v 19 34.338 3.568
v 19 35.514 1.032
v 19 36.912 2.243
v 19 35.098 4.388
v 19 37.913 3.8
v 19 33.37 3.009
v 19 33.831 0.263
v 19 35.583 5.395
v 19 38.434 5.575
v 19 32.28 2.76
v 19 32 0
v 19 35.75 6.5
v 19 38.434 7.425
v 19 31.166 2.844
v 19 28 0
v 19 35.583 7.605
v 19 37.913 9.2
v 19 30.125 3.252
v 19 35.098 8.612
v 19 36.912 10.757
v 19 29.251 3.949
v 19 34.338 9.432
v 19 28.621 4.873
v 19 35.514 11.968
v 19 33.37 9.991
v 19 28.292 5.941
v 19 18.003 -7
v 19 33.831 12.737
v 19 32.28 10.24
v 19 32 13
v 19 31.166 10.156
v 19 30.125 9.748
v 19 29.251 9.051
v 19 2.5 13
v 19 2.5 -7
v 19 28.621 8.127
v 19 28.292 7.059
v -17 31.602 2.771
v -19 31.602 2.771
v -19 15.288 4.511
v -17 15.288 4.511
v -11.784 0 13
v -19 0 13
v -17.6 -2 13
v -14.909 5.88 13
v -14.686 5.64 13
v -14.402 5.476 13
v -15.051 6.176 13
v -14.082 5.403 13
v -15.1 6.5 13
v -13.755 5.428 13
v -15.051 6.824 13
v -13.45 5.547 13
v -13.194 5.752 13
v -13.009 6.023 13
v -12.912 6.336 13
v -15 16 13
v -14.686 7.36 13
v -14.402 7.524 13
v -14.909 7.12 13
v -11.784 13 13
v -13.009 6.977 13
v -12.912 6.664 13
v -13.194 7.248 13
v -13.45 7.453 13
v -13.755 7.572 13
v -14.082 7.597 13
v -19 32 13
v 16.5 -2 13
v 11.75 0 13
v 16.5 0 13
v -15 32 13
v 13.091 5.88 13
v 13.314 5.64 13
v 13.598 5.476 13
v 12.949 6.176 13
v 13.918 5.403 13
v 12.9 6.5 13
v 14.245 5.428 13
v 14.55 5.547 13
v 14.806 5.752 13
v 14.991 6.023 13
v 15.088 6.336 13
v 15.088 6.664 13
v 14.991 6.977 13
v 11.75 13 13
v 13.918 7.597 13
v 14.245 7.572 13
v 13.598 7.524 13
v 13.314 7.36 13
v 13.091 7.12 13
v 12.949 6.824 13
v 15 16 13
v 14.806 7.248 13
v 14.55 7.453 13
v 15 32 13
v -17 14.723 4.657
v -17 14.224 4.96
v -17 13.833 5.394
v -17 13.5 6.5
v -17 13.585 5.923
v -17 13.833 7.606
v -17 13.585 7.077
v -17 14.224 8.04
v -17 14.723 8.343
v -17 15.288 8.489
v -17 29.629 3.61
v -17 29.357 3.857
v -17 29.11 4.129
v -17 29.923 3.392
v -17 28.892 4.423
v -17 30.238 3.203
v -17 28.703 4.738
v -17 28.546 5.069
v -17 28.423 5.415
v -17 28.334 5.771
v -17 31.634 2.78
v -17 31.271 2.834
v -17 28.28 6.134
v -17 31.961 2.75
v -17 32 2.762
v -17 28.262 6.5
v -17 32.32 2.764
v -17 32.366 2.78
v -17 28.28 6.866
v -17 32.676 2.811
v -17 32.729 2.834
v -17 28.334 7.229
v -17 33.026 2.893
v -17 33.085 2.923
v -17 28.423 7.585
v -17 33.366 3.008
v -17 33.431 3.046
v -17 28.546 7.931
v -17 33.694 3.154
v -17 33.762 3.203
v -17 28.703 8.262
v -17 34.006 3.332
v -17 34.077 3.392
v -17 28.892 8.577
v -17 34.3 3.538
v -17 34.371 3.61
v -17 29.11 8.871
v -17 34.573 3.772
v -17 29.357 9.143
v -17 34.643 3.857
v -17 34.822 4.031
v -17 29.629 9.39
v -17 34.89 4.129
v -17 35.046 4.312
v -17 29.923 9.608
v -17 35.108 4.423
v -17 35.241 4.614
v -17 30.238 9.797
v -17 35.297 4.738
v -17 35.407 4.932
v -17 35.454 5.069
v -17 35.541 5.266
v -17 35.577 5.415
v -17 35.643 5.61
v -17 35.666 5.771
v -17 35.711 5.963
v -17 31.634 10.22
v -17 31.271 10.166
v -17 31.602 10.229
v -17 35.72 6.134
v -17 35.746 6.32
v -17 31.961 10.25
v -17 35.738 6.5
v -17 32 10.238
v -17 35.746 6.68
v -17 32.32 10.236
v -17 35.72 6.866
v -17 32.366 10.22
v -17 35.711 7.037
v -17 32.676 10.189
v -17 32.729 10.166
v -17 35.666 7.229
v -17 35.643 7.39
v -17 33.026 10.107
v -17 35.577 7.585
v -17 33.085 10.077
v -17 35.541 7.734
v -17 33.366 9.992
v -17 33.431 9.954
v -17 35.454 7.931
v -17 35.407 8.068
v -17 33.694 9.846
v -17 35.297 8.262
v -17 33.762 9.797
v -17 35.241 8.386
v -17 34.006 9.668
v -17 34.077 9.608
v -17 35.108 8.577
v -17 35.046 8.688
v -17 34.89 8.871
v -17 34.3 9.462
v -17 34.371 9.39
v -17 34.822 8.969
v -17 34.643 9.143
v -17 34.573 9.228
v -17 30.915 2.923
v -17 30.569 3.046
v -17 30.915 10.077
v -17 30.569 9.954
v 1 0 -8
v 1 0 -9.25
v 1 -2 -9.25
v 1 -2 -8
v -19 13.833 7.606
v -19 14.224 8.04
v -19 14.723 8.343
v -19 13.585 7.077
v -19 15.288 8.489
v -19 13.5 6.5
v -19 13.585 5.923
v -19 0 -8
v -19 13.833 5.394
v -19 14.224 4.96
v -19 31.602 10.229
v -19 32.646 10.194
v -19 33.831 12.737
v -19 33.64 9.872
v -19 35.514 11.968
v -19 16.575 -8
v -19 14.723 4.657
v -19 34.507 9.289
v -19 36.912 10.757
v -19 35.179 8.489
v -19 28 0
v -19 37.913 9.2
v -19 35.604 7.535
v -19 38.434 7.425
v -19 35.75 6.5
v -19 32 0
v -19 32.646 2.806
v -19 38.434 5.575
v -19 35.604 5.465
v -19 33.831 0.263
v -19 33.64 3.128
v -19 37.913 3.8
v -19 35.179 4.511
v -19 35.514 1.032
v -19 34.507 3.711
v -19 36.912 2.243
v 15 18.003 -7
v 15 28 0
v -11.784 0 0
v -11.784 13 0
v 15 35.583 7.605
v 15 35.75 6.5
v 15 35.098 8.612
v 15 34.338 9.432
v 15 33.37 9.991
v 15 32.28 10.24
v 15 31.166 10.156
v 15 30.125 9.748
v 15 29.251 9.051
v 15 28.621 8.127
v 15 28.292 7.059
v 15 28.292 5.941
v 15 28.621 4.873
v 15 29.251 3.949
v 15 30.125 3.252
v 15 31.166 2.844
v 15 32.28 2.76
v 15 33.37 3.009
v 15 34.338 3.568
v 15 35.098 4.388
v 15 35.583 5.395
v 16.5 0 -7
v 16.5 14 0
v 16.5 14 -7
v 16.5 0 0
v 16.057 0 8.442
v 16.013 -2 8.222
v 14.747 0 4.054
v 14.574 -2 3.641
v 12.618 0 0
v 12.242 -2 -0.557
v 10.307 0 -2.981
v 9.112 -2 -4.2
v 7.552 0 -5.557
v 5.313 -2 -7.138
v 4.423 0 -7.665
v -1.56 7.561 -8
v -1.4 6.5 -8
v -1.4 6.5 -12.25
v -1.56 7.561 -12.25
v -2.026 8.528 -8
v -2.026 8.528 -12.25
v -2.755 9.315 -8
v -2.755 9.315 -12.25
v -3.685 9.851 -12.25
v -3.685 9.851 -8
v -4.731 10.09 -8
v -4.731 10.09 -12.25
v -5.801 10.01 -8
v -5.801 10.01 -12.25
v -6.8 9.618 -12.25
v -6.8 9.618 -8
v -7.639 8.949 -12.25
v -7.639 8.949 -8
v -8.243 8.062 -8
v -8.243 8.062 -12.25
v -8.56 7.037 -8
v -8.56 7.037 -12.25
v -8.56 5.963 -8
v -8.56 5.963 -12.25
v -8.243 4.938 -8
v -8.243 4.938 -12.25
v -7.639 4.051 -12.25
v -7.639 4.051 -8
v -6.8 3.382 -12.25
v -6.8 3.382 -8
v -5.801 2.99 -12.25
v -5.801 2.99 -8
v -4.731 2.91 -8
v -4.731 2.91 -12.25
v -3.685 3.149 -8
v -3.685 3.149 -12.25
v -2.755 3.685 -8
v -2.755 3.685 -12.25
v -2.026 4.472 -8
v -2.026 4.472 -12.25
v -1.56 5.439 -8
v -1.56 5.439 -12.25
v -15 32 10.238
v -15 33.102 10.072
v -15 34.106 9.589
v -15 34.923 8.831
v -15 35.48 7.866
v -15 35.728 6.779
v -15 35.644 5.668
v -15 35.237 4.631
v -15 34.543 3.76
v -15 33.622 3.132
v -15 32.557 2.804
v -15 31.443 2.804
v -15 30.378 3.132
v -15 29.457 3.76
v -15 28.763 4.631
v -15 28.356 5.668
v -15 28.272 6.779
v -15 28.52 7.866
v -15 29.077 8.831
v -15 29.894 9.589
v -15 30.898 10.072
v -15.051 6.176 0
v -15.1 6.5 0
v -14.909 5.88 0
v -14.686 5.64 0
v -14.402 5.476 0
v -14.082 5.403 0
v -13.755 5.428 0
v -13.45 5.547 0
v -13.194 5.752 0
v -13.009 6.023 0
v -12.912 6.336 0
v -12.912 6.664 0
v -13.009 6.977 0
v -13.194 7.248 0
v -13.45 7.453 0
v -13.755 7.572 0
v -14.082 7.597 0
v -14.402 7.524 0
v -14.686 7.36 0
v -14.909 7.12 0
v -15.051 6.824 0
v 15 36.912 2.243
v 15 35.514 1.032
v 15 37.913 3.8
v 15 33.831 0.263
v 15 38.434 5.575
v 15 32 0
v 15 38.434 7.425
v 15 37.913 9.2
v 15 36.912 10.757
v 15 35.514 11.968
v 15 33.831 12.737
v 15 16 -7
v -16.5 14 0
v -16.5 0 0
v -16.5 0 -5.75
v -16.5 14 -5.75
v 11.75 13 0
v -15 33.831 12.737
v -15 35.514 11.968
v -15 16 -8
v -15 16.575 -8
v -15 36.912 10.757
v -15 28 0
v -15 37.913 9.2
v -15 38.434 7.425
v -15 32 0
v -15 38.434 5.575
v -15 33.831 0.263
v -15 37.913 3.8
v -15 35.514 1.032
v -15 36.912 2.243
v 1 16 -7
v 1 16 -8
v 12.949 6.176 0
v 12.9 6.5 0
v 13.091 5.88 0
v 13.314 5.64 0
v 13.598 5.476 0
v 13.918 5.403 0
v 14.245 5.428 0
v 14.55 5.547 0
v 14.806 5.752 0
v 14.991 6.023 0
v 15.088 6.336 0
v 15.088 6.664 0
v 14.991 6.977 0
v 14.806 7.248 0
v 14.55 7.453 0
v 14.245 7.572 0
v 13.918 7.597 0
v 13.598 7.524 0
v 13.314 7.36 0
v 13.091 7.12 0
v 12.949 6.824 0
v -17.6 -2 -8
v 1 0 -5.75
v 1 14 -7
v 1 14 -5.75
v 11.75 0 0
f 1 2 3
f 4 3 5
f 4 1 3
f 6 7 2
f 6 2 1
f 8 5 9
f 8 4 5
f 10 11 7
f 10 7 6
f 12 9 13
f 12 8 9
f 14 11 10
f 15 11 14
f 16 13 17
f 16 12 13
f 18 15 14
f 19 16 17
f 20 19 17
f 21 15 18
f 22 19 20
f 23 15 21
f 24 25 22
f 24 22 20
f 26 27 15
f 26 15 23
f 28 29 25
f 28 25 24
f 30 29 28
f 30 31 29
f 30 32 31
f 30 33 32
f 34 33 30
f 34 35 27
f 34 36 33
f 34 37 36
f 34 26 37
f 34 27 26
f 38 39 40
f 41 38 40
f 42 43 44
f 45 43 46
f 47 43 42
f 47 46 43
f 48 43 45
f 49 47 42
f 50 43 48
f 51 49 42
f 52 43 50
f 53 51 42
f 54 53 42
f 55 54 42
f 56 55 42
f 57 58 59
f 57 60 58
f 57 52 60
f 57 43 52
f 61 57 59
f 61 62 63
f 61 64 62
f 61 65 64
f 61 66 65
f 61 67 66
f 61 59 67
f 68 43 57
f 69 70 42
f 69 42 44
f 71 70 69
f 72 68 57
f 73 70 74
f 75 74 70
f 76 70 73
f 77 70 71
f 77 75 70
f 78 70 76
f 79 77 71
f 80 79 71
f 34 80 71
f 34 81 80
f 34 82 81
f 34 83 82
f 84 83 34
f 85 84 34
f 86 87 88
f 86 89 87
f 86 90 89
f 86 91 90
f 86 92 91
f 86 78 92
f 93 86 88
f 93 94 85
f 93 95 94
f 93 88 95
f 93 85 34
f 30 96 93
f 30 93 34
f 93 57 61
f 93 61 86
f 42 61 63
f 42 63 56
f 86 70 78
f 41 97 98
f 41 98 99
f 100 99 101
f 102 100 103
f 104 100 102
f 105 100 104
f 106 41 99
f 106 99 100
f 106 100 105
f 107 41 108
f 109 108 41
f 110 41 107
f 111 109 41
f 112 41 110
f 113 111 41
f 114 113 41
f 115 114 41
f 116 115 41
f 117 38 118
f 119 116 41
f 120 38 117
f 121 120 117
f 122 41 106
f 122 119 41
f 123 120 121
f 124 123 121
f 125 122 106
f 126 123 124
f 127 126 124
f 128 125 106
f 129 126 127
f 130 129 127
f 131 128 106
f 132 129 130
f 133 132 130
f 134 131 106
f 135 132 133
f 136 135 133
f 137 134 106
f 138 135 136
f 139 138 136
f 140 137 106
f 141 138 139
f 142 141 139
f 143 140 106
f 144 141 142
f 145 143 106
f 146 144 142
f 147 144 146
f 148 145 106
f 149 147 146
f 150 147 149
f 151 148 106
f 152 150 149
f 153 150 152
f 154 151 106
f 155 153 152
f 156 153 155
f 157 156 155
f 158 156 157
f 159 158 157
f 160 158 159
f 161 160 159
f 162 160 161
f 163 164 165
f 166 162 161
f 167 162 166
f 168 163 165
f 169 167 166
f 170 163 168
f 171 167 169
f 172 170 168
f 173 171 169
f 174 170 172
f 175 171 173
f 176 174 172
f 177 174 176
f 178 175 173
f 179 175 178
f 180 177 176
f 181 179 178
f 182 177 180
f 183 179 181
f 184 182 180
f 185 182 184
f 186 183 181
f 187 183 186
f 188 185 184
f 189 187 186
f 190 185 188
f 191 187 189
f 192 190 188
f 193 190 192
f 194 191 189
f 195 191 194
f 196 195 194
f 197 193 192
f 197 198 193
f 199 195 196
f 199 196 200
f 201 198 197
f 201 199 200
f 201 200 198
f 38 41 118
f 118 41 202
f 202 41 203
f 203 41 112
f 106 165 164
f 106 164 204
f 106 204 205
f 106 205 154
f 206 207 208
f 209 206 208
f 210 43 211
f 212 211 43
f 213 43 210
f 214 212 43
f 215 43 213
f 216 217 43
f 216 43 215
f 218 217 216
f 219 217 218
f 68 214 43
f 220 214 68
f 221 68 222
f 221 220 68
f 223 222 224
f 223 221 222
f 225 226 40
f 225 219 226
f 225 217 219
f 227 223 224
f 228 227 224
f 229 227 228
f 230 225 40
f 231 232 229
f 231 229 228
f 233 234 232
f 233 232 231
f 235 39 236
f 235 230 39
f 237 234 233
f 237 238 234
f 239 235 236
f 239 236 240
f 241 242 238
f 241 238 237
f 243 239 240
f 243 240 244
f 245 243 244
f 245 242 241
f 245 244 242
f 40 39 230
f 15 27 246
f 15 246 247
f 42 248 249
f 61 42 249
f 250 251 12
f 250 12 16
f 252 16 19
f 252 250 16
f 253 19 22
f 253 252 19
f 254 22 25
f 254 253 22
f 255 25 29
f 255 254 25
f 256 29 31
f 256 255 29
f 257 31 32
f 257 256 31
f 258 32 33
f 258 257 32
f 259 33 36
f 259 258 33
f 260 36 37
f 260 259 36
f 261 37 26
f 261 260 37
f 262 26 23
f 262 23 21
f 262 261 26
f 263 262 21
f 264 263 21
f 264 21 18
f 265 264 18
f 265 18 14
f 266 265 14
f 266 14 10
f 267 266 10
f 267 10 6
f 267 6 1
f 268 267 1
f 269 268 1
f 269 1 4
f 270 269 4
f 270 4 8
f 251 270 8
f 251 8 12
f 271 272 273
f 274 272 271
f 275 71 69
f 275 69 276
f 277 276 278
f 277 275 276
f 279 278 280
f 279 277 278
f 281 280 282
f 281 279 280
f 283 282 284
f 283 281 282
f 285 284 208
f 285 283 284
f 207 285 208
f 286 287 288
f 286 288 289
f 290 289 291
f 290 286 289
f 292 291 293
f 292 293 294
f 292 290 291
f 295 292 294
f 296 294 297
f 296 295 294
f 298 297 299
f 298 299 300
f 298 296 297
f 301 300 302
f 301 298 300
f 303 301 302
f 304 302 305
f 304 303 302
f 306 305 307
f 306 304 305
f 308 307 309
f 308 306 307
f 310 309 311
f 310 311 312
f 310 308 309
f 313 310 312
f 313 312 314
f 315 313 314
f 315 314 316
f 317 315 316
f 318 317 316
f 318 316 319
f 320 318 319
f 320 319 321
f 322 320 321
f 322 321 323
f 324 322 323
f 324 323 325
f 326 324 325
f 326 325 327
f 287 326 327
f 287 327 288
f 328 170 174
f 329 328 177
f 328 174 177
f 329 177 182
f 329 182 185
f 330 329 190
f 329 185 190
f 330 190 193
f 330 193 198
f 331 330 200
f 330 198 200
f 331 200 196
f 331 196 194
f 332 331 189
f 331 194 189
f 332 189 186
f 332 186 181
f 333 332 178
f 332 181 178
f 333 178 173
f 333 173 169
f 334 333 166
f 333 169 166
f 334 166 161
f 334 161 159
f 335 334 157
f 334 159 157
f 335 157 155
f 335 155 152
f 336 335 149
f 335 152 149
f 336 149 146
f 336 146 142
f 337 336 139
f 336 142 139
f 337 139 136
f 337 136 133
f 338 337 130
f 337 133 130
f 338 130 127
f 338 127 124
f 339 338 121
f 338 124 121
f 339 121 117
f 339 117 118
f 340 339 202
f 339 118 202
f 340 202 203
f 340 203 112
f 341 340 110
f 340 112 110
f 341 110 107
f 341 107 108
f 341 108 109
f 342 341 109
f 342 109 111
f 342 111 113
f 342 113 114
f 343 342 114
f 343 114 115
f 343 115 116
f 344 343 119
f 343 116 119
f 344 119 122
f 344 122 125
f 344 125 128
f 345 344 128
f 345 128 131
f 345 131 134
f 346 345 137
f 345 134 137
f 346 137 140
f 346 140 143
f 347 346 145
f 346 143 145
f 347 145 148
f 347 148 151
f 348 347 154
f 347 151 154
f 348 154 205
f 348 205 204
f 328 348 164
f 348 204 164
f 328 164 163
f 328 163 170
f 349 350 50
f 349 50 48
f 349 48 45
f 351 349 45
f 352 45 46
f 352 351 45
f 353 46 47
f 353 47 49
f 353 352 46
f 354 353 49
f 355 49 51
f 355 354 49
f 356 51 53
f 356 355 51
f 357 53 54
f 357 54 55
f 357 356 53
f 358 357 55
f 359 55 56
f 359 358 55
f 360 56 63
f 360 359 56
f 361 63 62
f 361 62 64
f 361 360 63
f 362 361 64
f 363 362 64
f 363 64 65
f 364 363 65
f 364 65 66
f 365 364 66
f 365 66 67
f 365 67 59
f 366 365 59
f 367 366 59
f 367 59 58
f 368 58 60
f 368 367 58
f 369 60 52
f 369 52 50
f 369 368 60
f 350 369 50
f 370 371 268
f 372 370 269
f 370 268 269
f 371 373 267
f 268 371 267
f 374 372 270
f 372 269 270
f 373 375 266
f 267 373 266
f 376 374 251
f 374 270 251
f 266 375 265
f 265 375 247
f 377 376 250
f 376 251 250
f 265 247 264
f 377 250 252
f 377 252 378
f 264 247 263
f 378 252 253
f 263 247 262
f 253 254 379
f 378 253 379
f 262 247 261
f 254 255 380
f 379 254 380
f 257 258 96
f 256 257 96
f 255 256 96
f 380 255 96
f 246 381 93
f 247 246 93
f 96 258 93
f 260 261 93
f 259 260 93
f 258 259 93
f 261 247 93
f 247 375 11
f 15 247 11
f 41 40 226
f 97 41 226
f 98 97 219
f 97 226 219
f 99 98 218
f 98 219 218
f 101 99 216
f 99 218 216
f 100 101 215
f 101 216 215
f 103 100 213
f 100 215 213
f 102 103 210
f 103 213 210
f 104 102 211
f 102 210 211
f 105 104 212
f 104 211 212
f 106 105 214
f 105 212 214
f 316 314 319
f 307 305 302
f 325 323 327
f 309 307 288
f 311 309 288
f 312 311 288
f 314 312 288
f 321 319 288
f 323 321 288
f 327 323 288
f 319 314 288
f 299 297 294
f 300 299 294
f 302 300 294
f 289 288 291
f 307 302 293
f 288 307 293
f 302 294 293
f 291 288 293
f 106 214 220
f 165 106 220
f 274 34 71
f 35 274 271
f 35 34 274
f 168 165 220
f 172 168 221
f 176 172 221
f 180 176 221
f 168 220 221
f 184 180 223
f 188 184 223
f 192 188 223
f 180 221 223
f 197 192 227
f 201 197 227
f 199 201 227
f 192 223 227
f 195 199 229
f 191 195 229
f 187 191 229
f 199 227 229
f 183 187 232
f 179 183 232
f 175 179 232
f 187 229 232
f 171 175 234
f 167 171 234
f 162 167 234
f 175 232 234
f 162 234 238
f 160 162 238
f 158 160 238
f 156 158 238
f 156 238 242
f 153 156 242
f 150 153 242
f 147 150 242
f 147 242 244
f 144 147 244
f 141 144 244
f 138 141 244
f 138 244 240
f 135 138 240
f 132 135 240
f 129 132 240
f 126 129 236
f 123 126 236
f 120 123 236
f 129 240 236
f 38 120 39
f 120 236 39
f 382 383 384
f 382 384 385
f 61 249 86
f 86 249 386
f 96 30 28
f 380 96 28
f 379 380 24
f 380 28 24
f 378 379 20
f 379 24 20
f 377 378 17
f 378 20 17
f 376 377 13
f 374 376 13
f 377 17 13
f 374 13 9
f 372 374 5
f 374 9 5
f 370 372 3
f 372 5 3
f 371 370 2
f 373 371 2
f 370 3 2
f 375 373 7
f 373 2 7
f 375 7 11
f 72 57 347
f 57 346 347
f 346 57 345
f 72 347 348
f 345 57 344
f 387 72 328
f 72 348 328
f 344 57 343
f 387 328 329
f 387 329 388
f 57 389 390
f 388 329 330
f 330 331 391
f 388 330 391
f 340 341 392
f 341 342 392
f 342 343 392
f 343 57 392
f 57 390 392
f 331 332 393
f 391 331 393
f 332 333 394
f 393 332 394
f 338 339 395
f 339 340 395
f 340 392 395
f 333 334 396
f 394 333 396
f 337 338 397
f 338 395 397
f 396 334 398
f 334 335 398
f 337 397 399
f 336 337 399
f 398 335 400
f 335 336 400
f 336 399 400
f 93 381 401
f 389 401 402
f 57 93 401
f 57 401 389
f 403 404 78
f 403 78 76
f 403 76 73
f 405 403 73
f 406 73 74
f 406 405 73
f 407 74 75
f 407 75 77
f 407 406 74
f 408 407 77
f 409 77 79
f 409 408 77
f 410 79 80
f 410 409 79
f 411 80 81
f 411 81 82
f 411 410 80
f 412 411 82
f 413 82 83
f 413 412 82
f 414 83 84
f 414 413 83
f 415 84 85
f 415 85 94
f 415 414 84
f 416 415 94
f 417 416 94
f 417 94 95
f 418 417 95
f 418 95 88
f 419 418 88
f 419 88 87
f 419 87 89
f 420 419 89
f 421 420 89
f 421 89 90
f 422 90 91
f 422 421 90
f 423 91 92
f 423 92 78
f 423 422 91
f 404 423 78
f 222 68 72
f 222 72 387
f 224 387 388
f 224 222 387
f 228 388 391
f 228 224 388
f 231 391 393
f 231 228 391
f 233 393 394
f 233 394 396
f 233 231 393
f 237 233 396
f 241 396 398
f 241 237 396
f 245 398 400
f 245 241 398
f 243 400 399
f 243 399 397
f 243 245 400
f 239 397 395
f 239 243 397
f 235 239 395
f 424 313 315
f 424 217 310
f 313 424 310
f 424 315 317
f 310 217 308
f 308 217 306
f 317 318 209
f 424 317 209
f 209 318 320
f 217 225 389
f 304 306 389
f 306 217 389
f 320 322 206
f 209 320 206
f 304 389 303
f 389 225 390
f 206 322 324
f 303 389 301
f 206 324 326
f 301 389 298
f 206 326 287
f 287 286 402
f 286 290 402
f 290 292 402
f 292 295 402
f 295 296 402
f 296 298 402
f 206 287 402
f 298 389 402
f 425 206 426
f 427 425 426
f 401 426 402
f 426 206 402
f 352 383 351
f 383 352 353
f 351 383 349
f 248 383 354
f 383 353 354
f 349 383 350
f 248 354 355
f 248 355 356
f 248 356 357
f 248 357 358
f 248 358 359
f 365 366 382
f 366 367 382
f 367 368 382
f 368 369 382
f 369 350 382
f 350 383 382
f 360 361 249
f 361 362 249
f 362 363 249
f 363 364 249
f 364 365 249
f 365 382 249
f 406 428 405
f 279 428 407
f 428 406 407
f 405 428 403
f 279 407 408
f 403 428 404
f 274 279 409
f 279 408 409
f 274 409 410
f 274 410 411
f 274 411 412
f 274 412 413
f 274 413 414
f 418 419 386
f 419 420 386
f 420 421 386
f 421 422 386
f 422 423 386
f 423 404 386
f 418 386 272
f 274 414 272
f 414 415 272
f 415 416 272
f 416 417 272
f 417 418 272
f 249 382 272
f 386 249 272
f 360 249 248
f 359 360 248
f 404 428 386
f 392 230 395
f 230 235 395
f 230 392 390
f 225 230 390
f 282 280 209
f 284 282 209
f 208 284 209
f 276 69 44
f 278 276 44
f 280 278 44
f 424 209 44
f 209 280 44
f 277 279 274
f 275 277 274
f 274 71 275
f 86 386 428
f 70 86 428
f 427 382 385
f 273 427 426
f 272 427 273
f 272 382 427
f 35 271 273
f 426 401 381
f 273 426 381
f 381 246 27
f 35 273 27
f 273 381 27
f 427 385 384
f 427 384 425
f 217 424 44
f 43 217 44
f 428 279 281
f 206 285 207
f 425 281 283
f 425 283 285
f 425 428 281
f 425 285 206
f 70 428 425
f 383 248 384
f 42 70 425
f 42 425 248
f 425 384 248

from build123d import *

# Parameters (mm, degrees)
SKETCH_1_R          = 1.1
EXTRUDE_1_DEPTH     = 13
EXTRUDE_2_DEPTH     = 4
CUT_EXTRUDE_1_DEPTH = 2
SKETCH_4_R          = 3.738204999
CUT_EXTRUDE_2_DEPTH = 2
EXTRUDE_4_DEPTH     = 7
CUT_EXTRUDE_START   = -10
SKETCH_9_R          = 3.75
CUT_EXTRUDE_3_DEPTH = 10
SKETCH_10_W         = 20
SKETCH_10_H         = 16
EXTRUDE_5_DEPTH     = 2.25
CHAMFER_1_SIZE      = 2.5
EXTRUDE_8_DEPTH     = 2
CUT_EXTRUDE_4_DEPTH = 1.25
SKETCH_11_R         = 3.6
EXTRUDE_9_DEPTH     = 5.25
SKETCH_15_W         = 17.5
SKETCH_15_H         = 14
EXTRUDE_10_DEPTH    = 1.25
CHAMFER_2_SIZE      = 12
CHAMFER_2_SIZE_2    = 8.402490459
CHAMFER_3_SIZE      = 8.402490459
CHAMFER_3_SIZE_2    = 12
CHAMFER_4_SIZE      = 2
CHAMFER_4_SIZE2     = 1.400415076


with BuildPart() as part:
    # 草图1 → 凸台-拉伸1 (new body)
    with BuildSketch(Plane.XY):
        Polygon((15, 16), (-15, 16), (-15, 32), (-19, 32), (-19, 0), (-11.784120735, 0), (-11.784120735, 13), (11.75, 13), (11.75, 0), (19, 0), (19, 32), (15, 32), align=None)
        with Locations(Location((-14, 6.5, 0), (0, 0, 180))):
            Circle(SKETCH_1_R, mode=Mode.SUBTRACT)
        with Locations(Location((14, 6.5, 0), (0, 0, 180))):
            Circle(SKETCH_1_R, mode=Mode.SUBTRACT)
    extrude(amount=EXTRUDE_1_DEPTH)

    # 草图2 → 凸台-拉伸2 (add)
    with BuildSketch(Plane(origin=(19, 0, 0), x_dir=(0, 0, -1), z_dir=(1, 0, 0))):
        with BuildLine():
            Line((0, 32), (-13, 32))
            ThreePointArc((-13, 32), (-6.5, 38.5), (0, 32))
        make_face()
    extrude_2 = extrude(amount=-EXTRUDE_2_DEPTH)

    # 镜向1: 凸台-拉伸2 across plane
    add(extrude_2.mirror(Plane(origin=(0, 0, 0), x_dir=(0, 0, 1), z_dir=(1, 0, 0))))

    # 草图3 → 切除-拉伸1 (cut)
    with BuildSketch(Plane.ZY.offset(19)):
        with BuildLine():
            Line((2.771151248, 31.602272727), (4.511280666, 15.287878788))
            ThreePointArc((4.511280666, 15.287878788), (6.5, 13.5), (8.488719334, 15.287878788))
            Line((8.488719334, 15.287878788), (10.228848752, 31.602272727))
            ThreePointArc((10.228848752, 31.602272727), (6.5, 35.75), (2.771151248, 31.602272727))
        make_face()
    extrude(amount=-CUT_EXTRUDE_1_DEPTH, mode=Mode.SUBTRACT)

    # 草图4 → 切除-拉伸2 (cut)
    with BuildSketch(Plane.ZY.offset(17)):
        with Locations((6.5, 32)):
            Circle(SKETCH_4_R)
    extrude(amount=-CUT_EXTRUDE_2_DEPTH, mode=Mode.SUBTRACT)

    # 草图5 → 凸台-拉伸4 (add)
    with BuildSketch(Plane(origin=(0, 0, 0), x_dir=(-1, 0, 0), z_dir=(0, 0, -1))):
        Polygon((-19, 16), (19, 16), (19, 0), (16.5, 0), (16.5, 14), (-16.5, 14), (-16.5, 0), (-19, 0), align=None)
    extrude(amount=EXTRUDE_4_DEPTH)

    # 草图9 → 切除-拉伸3 (cut)
    with BuildSketch(Plane(origin=(19, 0, 0), x_dir=(0, 0, -1), z_dir=(1, 0, 0)).offset(CUT_EXTRUDE_START)):
        with Locations(Location((-6.5, 32, 0), (0, 0, 90))):
            Circle(SKETCH_9_R)
    extrude(amount=CUT_EXTRUDE_3_DEPTH, mode=Mode.SUBTRACT)

    # 草图10 → 凸台-拉伸5 (add)
    with BuildSketch(Plane(origin=(0, 0, -7), x_dir=(-1, 0, 0), z_dir=(0, 0, -1))):
        with Locations((9, 8)):
            Rectangle(SKETCH_10_W, SKETCH_10_H)
    extrude(amount=EXTRUDE_5_DEPTH)

    # 倒角1
    chamfer_1_edges = [part.edges().sort_by_distance(p)[0] for p in [
        (19, 0, 3),
    ]]
    chamfer(chamfer_1_edges, length=CHAMFER_1_SIZE)

    # 草图12 → 凸台-拉伸8 (add)
    with BuildSketch(Plane.XZ):
        with BuildLine():
            Line((1, 13), (16.5, 13))
            ThreePointArc((16.5, 13), (12.241770088, -0.55746905), (1, -9.25))
            Line((1, -9.25), (-19, -9.25))
            Line((-19, -9.25), (-19, 13))
            Line((-19, 13), (1, 13))
        make_face()
    extrude(amount=EXTRUDE_8_DEPTH)

    # 草图13 → 切除-拉伸4 (cut)
    with BuildSketch(Plane(origin=(0, 0, -9.25), x_dir=(-1, 0, 0), z_dir=(0, 0, -1))):
        Polygon((19, -2), (19, 16), (-1, 16), (-1, 0), (-1, -2), align=None)
    extrude(amount=-CUT_EXTRUDE_4_DEPTH, mode=Mode.SUBTRACT)

    # 草图11 → 凸台-拉伸9 (add)
    with BuildSketch(Plane.XY.offset(-7)):
        with Locations((-5, 6.5)):
            Circle(SKETCH_11_R)
    extrude(amount=-EXTRUDE_9_DEPTH)

    # 草图15 → 凸台-拉伸10 (add)
    with BuildSketch(Plane.XY.offset(-7)):
        with Locations((-7.75, 7)):
            Rectangle(SKETCH_15_W, SKETCH_15_H)
    extrude(amount=EXTRUDE_10_DEPTH)

    # 倒角2
    # the kernel refuses this chamfer: 12, 8.402490459 mm, written as the material it adds along each edge
    with BuildSketch(Plane(origin=(-15, 16, 0), x_dir=(0, 0.9997533347641299, 0.022209674198457065), z_dir=(-1, 0, 0))) as chamfer_2_piece_1_section:
        Polygon((CHAMFER_2_SIZE * 0.999753334764, CHAMFER_2_SIZE * 0.0222096741985), (-CHAMFER_2_SIZE_2 * 0.0222096741972, CHAMFER_2_SIZE_2 * 0.999753334707), (0, 0), align=None)
    chamfer_2_piece_1 = extrude(amount=4, mode=Mode.PRIVATE)
    chamfer_2_piece_1 = split(chamfer_2_piece_1, bisect_by=Plane(origin=(-17, 20.095500367, -8), z_dir=(0, 0, 1)), keep=Keep.TOP, mode=Mode.PRIVATE)
    add(chamfer_2_piece_1)

    # 倒角3
    # the kernel refuses this chamfer: 12, 8.402490459 mm, written as the material it adds along each edge
    with BuildSketch(Plane(origin=(19, 16, 0), x_dir=(0, -0.045263737714020834, -0.9989750717851553), z_dir=(-1, 0, 0))) as chamfer_3_piece_1_section:
        Polygon((CHAMFER_3_SIZE * 0.998975071728, -CHAMFER_3_SIZE * 0.0452637377114), (-CHAMFER_3_SIZE_2 * 0.045263737714, -CHAMFER_3_SIZE_2 * 0.998975071785), (0, 0), align=None)
    chamfer_3_piece_1 = extrude(amount=4, mode=Mode.PRIVATE)
    chamfer_3_piece_1 = split(chamfer_3_piece_1, bisect_by=Plane(origin=(17, 20.095500367, -7), z_dir=(0, 0, 1)), keep=Keep.TOP, mode=Mode.PRIVATE)
    add(chamfer_3_piece_1)

    # 倒角4
    chamfer_4_edges = [part.edges().sort_by_distance(p)[0] for p in [
        (-19, -2, 2.5),
    ]]
    chamfer_4_side = [part.faces().sort_by_distance(p)[0] for p in [
        (-19, 13.42478673, 3.080992557),
    ]]
    chamfer(chamfer_4_edges, length=CHAMFER_4_SIZE, length2=CHAMFER_4_SIZE2, reference=chamfer_4_side[0])


solid = part.part
